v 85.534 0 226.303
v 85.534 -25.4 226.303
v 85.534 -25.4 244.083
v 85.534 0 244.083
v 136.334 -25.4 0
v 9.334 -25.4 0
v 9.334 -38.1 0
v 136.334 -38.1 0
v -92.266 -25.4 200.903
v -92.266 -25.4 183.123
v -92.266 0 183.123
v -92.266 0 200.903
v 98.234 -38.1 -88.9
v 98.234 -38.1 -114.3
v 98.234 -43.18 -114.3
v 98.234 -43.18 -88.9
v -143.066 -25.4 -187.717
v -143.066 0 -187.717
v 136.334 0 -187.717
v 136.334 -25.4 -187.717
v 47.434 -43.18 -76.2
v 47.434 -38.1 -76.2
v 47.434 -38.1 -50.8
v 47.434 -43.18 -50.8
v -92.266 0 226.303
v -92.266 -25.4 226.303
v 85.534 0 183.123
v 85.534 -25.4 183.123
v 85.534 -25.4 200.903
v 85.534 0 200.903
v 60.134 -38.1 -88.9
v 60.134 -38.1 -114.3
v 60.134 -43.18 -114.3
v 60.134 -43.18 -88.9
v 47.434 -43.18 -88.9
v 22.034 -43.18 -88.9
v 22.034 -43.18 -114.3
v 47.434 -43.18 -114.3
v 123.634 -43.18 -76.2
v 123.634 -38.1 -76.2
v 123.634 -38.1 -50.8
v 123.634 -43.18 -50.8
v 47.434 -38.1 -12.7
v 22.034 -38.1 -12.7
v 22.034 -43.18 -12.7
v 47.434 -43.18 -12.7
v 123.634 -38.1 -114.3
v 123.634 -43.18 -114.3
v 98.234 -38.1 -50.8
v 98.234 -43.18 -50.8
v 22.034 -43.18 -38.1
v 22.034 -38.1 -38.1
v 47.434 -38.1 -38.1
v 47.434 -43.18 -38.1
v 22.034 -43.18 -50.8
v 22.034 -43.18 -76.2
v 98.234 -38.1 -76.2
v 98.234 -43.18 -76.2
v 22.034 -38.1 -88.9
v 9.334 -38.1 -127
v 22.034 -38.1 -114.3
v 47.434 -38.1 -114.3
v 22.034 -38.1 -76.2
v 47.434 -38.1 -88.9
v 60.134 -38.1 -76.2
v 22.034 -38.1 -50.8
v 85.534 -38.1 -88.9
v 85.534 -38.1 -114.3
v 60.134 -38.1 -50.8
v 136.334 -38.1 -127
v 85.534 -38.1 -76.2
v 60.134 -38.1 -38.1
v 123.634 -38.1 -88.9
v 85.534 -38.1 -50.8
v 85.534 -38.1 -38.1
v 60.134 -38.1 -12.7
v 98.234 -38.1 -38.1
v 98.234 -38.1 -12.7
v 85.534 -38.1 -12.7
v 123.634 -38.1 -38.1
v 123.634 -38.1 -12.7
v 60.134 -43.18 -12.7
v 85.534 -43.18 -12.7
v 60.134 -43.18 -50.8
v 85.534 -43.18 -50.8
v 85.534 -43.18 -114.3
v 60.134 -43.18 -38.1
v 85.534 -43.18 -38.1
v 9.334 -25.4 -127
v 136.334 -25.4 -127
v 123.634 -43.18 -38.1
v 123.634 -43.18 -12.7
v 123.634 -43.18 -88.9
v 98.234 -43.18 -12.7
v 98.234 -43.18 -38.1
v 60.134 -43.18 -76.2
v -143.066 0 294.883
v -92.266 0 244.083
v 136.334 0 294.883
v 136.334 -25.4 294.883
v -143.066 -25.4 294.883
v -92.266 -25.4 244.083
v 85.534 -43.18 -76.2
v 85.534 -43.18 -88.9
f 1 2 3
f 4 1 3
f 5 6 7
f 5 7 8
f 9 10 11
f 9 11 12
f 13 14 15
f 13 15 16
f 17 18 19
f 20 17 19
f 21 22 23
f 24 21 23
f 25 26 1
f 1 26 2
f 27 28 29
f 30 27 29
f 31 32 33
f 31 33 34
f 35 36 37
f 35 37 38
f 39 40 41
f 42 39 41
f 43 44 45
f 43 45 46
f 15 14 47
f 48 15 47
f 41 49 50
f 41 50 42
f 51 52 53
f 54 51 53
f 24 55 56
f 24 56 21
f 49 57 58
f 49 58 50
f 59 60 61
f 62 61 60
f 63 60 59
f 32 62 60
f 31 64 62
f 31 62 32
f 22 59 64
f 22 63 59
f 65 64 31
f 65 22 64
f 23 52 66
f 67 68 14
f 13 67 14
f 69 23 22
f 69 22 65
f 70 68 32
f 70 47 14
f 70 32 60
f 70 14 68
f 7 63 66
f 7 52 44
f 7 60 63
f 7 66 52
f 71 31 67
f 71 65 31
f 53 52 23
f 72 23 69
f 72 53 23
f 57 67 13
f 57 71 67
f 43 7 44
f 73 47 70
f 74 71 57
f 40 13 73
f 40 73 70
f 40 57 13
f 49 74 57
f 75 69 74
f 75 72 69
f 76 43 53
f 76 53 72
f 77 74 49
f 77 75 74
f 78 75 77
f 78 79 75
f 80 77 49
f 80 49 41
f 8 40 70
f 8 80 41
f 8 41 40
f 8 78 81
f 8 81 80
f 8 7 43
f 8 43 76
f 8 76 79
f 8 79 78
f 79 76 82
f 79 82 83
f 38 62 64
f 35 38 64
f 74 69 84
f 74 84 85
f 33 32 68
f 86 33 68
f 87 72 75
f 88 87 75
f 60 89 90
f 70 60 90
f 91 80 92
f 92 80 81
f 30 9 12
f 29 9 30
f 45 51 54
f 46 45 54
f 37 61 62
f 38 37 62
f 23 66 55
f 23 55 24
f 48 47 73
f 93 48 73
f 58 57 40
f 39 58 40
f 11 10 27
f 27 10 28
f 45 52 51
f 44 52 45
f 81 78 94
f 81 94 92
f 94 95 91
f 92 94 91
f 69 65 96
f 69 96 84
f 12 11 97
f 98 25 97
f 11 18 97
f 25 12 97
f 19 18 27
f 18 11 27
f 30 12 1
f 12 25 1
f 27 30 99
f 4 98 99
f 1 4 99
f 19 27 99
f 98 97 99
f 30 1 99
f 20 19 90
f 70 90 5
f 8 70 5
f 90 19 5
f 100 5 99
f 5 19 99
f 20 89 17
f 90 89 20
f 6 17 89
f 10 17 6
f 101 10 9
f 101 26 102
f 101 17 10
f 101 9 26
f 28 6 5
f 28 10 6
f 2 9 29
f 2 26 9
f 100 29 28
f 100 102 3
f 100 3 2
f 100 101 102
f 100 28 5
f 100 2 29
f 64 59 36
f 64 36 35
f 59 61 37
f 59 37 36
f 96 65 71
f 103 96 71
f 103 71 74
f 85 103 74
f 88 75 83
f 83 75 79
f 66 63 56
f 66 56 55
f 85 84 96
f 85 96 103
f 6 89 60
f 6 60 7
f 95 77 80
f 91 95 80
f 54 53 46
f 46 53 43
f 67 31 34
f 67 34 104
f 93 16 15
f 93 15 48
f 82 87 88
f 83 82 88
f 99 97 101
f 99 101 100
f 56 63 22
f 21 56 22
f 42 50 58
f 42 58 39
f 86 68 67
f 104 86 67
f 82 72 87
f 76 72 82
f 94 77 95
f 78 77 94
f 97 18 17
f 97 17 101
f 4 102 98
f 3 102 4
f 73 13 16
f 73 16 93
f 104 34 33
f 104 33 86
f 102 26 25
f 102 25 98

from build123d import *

# Parameters (mm, degrees)
F0_W     = 279.4
F0_H     = 482.6
F1_DEPTH = 25.4
F2_W     = 177.8
F2_H     = 17.78
F3_DEPTH = 25.4
F4_W     = 25.4
F4_H     = 25.4
F5_DEPTH = 17.78
F4_W_2   = 127
F4_H_2   = 127
F6_DEPTH = 12.7


with BuildPart() as f1:
    # F0 (on Front) → F1 (new body)
    with BuildSketch(Plane.XZ):
        with Locations((-3.365506, 53.583339)):
            Rectangle(F0_W, F0_H)
    extrude(amount=F1_DEPTH)

    # F2 (on face) → F3 (cut)
    with BuildSketch(Plane.XZ.offset(25.4)):
        with Locations((-3.365506, 235.193339)):
            Rectangle(F2_W, F2_H)
        with Locations((-3.365506, 192.013339)):
            Rectangle(F2_W, F2_H)
    extrude(amount=-F3_DEPTH, mode=Mode.SUBTRACT)

    # F4 (on face) → F5 (join)
    with BuildSketch(Plane.XZ.offset(25.4)):
        with Locations((34.734494, -101.6)):
            Rectangle(F4_W, F4_H)
        with Locations((72.834494, -101.6)):
            Rectangle(F4_W, F4_H)
        with Locations((110.934494, -101.6)):
            Rectangle(F4_W, F4_H)
        with Locations((110.934494, -63.5)):
            Rectangle(F4_W, F4_H)
        with Locations((72.834494, -63.5)):
            Rectangle(F4_W, F4_H)
        with Locations((34.734494, -63.5)):
            Rectangle(F4_W, F4_H)
        with Locations((34.734494, -25.4)):
            Rectangle(F4_W, F4_H)
        with Locations((72.834494, -25.4)):
            Rectangle(F4_W, F4_H)
        with Locations((110.934494, -25.4)):
            Rectangle(F4_W, F4_H)
    extrude(amount=F5_DEPTH)

    # F4 (on face) → F6 (join)
    with BuildSketch(Plane.XZ.offset(25.4)):
        with Locations((72.834494, -63.5)):
            Rectangle(F4_W_2, F4_H_2)
        with Locations((34.734494, -101.6)):
            Rectangle(F4_W, F4_H, mode=Mode.SUBTRACT)
        with Locations((72.834494, -101.6)):
            Rectangle(F4_W, F4_H, mode=Mode.SUBTRACT)
        with Locations((110.934494, -101.6)):
            Rectangle(F4_W, F4_H, mode=Mode.SUBTRACT)
        with Locations((34.734494, -63.5)):
            Rectangle(F4_W, F4_H, mode=Mode.SUBTRACT)
        with Locations((34.734494, -25.4)):
            Rectangle(F4_W, F4_H, mode=Mode.SUBTRACT)
        with Locations((72.834494, -63.5)):
            Rectangle(F4_W, F4_H, mode=Mode.SUBTRACT)
        with Locations((72.834494, -25.4)):
            Rectangle(F4_W, F4_H, mode=Mode.SUBTRACT)
        with Locations((110.934494, -63.5)):
            Rectangle(F4_W, F4_H, mode=Mode.SUBTRACT)
        with Locations((110.934494, -25.4)):
            Rectangle(F4_W, F4_H, mode=Mode.SUBTRACT)
    extrude(amount=F6_DEPTH)


solid = f1.part
